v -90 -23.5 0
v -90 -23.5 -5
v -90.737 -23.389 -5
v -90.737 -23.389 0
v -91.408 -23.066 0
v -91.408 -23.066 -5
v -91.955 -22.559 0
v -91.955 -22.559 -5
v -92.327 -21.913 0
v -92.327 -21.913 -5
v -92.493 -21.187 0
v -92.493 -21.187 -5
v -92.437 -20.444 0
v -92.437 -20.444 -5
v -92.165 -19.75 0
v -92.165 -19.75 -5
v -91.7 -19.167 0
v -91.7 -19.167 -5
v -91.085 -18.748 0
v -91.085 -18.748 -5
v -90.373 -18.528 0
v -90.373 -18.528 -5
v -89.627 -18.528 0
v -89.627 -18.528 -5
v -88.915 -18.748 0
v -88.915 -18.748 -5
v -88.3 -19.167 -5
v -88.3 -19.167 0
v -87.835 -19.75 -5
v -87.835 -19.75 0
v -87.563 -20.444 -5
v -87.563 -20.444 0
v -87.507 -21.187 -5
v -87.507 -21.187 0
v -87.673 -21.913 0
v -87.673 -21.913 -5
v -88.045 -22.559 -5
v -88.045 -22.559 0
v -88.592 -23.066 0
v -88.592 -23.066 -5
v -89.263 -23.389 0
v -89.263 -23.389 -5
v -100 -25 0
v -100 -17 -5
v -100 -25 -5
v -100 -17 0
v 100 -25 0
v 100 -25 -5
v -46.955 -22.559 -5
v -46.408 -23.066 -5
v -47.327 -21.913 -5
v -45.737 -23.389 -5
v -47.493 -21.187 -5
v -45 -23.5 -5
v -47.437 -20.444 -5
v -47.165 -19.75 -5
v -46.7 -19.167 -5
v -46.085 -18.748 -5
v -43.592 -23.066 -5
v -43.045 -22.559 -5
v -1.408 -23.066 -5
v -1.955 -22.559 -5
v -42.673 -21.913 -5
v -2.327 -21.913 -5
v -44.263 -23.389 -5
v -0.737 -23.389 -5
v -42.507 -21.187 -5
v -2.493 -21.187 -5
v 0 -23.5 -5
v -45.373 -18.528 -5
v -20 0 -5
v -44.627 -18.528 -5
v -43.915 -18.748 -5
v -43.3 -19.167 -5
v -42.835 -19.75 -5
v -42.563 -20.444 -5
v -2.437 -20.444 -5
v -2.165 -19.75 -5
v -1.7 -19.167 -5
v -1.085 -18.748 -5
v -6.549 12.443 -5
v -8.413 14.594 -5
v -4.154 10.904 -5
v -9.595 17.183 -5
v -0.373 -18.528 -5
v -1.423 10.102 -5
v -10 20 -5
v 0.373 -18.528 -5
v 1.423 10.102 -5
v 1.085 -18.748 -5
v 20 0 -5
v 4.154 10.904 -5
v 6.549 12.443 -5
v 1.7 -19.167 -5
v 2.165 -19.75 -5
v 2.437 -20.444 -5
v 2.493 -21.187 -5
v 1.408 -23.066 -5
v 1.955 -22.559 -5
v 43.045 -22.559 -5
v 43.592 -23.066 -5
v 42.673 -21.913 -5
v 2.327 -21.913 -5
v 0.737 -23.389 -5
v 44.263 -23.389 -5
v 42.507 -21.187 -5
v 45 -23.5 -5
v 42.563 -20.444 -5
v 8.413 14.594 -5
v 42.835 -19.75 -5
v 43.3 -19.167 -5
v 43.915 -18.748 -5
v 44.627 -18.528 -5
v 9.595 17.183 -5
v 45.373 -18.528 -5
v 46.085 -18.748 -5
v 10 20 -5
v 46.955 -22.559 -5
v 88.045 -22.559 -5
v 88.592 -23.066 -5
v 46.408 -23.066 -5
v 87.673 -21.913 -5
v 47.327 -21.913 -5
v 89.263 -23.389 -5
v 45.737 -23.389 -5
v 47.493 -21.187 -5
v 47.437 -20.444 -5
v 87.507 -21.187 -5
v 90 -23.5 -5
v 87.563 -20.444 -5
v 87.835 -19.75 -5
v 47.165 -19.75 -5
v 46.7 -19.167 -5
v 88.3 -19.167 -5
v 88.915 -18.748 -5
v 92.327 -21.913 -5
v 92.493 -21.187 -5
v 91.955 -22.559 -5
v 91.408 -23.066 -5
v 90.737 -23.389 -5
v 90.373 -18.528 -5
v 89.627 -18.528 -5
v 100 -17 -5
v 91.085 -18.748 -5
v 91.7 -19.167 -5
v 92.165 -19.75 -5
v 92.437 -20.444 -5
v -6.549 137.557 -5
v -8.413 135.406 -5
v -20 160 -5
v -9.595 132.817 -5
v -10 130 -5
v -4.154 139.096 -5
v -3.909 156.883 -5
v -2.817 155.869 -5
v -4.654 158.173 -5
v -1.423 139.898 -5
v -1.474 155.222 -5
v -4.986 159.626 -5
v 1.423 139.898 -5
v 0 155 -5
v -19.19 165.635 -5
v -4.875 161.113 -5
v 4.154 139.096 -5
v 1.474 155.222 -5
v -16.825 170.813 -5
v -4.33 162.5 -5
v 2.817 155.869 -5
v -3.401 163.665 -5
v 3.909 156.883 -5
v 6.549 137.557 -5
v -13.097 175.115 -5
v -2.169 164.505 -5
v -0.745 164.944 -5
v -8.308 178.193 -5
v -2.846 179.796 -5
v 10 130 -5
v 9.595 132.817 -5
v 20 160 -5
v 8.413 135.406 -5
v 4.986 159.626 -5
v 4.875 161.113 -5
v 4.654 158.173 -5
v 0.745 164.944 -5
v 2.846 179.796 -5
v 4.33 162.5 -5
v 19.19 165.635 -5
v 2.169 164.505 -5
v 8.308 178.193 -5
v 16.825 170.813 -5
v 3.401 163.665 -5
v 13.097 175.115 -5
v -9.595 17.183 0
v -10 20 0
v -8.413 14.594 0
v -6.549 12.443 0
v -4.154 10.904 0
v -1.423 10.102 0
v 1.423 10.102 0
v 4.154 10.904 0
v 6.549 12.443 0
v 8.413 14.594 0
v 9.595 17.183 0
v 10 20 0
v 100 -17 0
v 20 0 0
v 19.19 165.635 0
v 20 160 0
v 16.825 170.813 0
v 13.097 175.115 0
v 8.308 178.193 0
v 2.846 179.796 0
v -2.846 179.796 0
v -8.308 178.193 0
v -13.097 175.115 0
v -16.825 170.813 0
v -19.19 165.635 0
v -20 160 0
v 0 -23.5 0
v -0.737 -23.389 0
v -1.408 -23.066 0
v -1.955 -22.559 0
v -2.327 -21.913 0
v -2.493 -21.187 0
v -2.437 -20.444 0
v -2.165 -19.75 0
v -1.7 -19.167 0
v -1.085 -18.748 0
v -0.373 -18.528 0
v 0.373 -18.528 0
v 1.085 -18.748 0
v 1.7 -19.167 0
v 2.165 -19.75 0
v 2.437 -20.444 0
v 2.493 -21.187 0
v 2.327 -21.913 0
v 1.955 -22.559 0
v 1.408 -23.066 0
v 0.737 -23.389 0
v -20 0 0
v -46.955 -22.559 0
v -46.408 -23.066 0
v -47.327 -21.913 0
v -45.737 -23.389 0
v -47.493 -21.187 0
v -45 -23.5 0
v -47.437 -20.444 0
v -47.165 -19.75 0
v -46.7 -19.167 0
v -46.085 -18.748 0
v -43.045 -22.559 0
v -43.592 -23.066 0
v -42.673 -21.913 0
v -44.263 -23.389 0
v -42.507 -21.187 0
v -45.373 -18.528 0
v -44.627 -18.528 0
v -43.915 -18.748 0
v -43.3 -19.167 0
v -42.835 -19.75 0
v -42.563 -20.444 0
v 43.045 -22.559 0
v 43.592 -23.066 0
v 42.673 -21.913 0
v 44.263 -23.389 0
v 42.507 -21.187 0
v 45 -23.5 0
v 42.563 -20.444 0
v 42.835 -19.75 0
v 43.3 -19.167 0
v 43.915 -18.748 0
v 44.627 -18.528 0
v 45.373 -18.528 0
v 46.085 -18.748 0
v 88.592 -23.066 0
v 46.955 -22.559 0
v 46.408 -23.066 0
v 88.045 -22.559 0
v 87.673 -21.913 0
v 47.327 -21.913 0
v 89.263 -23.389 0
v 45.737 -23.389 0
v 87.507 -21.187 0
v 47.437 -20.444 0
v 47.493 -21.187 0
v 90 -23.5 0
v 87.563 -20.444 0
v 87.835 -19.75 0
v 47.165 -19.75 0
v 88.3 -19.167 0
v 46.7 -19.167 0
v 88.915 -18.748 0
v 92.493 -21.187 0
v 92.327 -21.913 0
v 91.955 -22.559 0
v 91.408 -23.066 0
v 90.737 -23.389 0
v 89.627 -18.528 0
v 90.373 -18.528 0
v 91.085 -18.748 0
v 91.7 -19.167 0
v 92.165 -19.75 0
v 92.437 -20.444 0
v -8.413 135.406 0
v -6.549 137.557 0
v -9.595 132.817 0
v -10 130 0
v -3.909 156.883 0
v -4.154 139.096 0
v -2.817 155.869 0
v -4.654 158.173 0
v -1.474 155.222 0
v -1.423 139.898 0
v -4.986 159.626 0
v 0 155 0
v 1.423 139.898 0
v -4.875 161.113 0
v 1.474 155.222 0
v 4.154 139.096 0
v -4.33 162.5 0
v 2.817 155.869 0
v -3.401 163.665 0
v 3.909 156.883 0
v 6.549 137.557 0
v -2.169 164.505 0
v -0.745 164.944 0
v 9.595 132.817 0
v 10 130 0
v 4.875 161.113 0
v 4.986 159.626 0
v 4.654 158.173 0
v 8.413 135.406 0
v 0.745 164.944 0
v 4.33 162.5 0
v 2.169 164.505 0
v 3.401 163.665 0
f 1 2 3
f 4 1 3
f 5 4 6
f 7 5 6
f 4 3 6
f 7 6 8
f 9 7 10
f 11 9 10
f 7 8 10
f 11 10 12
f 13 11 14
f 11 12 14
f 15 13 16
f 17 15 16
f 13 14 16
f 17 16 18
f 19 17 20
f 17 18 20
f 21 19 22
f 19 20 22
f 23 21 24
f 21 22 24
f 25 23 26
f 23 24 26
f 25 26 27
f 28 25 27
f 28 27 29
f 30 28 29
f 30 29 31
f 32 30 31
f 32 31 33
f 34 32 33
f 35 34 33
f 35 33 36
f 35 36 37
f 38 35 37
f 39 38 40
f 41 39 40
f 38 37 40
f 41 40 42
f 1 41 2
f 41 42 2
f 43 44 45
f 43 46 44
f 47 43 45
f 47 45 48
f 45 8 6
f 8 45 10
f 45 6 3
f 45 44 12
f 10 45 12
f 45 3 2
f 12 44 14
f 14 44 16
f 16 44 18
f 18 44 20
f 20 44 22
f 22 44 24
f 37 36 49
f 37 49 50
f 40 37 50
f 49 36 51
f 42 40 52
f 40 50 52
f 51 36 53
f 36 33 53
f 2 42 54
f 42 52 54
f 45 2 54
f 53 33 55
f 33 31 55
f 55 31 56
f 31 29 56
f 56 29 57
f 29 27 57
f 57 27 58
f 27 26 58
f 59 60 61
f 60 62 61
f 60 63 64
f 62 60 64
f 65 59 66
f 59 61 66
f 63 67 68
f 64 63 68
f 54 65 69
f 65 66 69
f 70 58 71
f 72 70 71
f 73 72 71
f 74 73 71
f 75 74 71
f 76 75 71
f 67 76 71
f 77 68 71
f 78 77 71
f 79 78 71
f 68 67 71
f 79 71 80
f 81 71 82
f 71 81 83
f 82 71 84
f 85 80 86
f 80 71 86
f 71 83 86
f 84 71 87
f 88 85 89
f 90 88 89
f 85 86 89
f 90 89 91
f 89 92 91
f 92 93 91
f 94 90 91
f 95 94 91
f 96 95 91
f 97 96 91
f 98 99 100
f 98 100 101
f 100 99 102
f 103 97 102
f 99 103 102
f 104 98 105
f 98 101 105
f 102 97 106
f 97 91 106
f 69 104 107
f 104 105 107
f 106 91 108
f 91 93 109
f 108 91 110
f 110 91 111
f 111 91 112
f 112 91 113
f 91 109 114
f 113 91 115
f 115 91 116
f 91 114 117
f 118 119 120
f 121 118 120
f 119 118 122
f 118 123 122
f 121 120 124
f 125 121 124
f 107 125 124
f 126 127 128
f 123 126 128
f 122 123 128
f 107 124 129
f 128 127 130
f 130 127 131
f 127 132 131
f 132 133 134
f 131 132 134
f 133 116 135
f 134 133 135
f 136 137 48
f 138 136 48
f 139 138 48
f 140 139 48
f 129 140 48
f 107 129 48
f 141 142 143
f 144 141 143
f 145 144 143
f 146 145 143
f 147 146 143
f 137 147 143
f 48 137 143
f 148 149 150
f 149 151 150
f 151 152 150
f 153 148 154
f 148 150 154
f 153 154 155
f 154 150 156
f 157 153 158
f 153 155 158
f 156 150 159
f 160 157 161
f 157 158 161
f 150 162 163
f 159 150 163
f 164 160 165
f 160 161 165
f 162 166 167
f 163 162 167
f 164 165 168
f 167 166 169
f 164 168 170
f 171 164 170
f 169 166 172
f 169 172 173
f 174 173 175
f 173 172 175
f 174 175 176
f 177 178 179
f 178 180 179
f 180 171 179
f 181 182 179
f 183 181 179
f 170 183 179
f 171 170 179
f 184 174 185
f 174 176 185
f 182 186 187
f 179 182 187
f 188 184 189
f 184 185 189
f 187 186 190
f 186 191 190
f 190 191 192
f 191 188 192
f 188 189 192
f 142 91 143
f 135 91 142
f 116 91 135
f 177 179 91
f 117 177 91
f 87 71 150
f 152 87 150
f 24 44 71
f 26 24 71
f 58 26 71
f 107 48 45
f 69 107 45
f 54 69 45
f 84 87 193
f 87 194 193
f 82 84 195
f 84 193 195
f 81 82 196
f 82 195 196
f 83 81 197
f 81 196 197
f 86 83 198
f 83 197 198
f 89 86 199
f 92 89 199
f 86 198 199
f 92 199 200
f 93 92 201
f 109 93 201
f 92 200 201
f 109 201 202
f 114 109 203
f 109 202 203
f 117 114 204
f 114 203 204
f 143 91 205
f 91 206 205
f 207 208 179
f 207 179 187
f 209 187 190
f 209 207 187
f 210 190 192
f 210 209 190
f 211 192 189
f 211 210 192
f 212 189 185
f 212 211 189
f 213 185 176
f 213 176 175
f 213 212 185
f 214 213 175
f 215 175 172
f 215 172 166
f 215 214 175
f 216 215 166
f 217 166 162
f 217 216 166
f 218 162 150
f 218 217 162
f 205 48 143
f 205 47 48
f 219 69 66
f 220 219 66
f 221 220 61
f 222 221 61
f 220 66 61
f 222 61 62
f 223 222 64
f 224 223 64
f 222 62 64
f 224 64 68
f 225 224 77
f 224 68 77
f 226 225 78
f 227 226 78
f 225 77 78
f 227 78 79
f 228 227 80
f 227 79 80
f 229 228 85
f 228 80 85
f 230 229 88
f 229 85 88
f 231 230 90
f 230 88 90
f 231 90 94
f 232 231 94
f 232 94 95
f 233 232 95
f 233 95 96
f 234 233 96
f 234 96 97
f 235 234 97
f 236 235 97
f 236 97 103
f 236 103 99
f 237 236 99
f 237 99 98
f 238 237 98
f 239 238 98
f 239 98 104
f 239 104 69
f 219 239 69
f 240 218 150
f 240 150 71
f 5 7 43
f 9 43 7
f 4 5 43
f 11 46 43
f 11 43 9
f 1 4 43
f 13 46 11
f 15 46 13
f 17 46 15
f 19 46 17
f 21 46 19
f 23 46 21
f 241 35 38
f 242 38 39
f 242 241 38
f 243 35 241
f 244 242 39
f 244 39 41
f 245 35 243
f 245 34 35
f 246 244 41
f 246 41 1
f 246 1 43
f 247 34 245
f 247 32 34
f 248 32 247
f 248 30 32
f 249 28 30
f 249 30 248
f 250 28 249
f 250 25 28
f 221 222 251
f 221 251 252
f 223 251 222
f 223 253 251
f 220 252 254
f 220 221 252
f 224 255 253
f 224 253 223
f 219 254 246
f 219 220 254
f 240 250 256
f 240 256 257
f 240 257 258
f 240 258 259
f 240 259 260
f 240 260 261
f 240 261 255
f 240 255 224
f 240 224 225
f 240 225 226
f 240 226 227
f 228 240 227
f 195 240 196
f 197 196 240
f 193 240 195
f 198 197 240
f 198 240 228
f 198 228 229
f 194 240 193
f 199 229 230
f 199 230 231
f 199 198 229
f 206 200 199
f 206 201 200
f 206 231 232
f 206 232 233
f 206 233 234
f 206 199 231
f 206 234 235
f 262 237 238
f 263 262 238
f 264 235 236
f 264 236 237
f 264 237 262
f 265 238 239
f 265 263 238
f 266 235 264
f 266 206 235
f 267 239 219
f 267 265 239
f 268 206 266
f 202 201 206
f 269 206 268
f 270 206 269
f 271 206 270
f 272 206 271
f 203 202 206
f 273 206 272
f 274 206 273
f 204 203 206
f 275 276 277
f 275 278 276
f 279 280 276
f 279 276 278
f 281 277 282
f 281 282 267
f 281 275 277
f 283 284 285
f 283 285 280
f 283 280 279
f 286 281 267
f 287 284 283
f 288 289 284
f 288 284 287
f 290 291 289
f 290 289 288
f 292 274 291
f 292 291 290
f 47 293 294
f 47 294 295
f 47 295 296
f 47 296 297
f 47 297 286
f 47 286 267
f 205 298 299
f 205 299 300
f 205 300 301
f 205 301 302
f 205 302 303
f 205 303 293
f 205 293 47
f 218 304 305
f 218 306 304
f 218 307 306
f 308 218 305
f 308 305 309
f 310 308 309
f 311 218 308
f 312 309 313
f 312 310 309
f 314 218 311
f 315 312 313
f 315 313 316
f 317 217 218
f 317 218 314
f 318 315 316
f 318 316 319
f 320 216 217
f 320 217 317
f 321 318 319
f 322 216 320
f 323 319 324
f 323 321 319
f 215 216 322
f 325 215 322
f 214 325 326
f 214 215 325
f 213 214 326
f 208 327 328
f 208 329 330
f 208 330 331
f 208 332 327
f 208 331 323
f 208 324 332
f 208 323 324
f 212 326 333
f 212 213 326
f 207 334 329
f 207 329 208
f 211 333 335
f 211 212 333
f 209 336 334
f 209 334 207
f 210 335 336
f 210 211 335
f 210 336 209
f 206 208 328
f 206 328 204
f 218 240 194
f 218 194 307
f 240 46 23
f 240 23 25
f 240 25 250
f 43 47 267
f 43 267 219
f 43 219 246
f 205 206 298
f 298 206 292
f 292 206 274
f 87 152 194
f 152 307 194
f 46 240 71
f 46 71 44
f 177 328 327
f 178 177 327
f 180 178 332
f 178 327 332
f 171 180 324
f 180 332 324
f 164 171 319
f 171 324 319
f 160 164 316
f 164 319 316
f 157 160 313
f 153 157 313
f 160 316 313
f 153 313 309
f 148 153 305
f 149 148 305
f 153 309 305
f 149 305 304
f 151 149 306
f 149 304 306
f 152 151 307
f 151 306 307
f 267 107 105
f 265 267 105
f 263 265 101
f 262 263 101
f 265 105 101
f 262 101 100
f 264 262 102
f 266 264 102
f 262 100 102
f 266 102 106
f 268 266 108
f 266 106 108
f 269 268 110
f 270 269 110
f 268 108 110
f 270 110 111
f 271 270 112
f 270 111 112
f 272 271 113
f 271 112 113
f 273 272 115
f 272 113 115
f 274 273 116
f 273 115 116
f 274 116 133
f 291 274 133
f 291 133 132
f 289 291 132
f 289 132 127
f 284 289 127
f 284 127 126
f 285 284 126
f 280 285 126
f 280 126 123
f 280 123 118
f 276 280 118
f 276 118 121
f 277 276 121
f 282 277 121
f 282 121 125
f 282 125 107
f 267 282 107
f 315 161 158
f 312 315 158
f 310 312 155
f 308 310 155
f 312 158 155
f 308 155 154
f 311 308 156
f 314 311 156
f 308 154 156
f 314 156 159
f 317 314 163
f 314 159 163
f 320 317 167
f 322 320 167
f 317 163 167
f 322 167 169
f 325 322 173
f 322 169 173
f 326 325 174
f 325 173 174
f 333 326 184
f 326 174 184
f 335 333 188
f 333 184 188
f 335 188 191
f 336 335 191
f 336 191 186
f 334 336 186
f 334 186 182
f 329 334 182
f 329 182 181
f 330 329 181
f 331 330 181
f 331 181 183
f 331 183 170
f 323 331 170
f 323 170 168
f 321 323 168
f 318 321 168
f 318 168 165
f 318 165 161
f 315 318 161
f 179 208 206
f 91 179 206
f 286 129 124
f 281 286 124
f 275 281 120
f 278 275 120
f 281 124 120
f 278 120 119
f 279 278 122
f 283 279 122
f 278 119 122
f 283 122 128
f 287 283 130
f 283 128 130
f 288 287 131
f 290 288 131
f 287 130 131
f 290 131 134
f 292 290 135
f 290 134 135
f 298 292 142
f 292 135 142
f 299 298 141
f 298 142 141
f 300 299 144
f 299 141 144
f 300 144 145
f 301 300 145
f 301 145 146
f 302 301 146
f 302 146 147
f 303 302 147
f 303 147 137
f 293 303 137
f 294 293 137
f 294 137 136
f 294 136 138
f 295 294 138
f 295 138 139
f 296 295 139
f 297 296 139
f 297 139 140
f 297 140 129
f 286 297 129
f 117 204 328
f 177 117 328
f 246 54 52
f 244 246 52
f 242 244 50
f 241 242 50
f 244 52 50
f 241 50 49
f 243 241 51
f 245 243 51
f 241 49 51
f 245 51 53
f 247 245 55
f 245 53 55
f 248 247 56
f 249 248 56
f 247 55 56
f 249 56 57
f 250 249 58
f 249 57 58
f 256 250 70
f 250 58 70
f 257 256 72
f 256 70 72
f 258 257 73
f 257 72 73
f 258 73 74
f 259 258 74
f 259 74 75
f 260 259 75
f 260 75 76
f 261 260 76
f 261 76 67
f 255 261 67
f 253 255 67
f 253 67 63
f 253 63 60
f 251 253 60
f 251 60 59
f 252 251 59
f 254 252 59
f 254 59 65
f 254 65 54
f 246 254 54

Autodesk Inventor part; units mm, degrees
ref_plane "YZ Plane" through (0, 0, 0) normal (1, 0, 0) x (0, 1, 0)
ref_plane "XZ Plane" through (0, 0, 0) normal (0, 1, 0) x (-1, 0, 0)
ref_plane "XY Plane" through (0, 0, 0) normal (0, 0, 1) x (1, 0, 0)
sketch "Sketch1" plane through (0, 0, 0) normal (0, 0, 1) x (1, 0, 0)
  line L0 (0, 0) -> (0, 91.5348) construction
  line L1 (-93.5855, 0) -> (93.5855, 0) construction
  arc A0 (20, 160) -> (-20, 160) centre (0, 160) ccw
  line L2 (-20, 160) -> (-20, 0)
  line L3 (-20, 0) -> (-100, -17)
  line L4 (-100, -17) -> (-100, -25)
  line L5 (-100, -25) -> (100, -25)
  line L6 (100, -25) -> (100, -17)
  line L7 (20, 160) -> (20, 0)
  line L8 (20, 0) -> (100, -17)
  dimension "d0" = 20
  dimension "d1" = 185
  dimension "d2" = 8
  dimension "d3" = 25
  dimension "d4" = 200
extrude "Extrusion1" add sketch "Sketch1" against normal blind 5
sketch "Sketch2" plane through (0, 0, 0) normal (0, 0, 1) x (1, 0, 0)
  line L0 (0, 20) -> (0, 130) construction
  line L1 (10, 20) -> (10, 130)
  line L2 (-10, 130) -> (-10, 20)
  arc A0 (-10, 20) -> (10, 20) centre (0, 20) ccw
  arc A1 (10, 130) -> (-10, 130) centre (0, 130) ccw
  arc A2 (20, 160) -> (-20, 160) centre (0, 160) ccw projected
  point P0 (0, 0)
  point P1 (0, 75)
  point P2 (0, 10)
  dimension "d7" = 30
  dimension "d8" = 10
  dimension "d9" = 110
extrude "Extrusion2" cut sketch "Sketch2" against normal up to surface (5 mm away)
sketch "Sketch3" plane through (0, 0, 0) normal (0, 0, 1) x (1, 0, 0)
  line L0 (-100, -25) -> (100, -25) projected
  point P0 (0, 0)
  point P1 (-90, -21)
  point P2 (-45, -21)
  point P3 (0, -21)
  point P4 (45, -21)
  point P5 (90, -21)
  dimension "d12" = 45
  dimension "d13" = 45
  dimension "d14" = 45
  dimension "d15" = 45
  dimension "d16" = 4
hole "Hole1" at (-90, -21, 0) at (-45, -21, 0) at (0, -21, 0) at (45, -21, 0) at (90, -21, 0) direction (0, 0, -1) diameter 5 depth 5
sketch "Sketch4" plane through (0, 0, 0) normal (0, 0, 1) x (1, 0, 0)
  arc A0 (20, 160) -> (-20, 160) centre (0, 160) ccw projected
  point P0 (0, 0)
hole "Hole2" at (0, 160, 0) direction (0, 0, -1) diameter 10 depth 5
equation "\"d13\" = d12"
equation "\"d14\" = d12"
equation "\"d15\" = d12"
properties part number "03A"
